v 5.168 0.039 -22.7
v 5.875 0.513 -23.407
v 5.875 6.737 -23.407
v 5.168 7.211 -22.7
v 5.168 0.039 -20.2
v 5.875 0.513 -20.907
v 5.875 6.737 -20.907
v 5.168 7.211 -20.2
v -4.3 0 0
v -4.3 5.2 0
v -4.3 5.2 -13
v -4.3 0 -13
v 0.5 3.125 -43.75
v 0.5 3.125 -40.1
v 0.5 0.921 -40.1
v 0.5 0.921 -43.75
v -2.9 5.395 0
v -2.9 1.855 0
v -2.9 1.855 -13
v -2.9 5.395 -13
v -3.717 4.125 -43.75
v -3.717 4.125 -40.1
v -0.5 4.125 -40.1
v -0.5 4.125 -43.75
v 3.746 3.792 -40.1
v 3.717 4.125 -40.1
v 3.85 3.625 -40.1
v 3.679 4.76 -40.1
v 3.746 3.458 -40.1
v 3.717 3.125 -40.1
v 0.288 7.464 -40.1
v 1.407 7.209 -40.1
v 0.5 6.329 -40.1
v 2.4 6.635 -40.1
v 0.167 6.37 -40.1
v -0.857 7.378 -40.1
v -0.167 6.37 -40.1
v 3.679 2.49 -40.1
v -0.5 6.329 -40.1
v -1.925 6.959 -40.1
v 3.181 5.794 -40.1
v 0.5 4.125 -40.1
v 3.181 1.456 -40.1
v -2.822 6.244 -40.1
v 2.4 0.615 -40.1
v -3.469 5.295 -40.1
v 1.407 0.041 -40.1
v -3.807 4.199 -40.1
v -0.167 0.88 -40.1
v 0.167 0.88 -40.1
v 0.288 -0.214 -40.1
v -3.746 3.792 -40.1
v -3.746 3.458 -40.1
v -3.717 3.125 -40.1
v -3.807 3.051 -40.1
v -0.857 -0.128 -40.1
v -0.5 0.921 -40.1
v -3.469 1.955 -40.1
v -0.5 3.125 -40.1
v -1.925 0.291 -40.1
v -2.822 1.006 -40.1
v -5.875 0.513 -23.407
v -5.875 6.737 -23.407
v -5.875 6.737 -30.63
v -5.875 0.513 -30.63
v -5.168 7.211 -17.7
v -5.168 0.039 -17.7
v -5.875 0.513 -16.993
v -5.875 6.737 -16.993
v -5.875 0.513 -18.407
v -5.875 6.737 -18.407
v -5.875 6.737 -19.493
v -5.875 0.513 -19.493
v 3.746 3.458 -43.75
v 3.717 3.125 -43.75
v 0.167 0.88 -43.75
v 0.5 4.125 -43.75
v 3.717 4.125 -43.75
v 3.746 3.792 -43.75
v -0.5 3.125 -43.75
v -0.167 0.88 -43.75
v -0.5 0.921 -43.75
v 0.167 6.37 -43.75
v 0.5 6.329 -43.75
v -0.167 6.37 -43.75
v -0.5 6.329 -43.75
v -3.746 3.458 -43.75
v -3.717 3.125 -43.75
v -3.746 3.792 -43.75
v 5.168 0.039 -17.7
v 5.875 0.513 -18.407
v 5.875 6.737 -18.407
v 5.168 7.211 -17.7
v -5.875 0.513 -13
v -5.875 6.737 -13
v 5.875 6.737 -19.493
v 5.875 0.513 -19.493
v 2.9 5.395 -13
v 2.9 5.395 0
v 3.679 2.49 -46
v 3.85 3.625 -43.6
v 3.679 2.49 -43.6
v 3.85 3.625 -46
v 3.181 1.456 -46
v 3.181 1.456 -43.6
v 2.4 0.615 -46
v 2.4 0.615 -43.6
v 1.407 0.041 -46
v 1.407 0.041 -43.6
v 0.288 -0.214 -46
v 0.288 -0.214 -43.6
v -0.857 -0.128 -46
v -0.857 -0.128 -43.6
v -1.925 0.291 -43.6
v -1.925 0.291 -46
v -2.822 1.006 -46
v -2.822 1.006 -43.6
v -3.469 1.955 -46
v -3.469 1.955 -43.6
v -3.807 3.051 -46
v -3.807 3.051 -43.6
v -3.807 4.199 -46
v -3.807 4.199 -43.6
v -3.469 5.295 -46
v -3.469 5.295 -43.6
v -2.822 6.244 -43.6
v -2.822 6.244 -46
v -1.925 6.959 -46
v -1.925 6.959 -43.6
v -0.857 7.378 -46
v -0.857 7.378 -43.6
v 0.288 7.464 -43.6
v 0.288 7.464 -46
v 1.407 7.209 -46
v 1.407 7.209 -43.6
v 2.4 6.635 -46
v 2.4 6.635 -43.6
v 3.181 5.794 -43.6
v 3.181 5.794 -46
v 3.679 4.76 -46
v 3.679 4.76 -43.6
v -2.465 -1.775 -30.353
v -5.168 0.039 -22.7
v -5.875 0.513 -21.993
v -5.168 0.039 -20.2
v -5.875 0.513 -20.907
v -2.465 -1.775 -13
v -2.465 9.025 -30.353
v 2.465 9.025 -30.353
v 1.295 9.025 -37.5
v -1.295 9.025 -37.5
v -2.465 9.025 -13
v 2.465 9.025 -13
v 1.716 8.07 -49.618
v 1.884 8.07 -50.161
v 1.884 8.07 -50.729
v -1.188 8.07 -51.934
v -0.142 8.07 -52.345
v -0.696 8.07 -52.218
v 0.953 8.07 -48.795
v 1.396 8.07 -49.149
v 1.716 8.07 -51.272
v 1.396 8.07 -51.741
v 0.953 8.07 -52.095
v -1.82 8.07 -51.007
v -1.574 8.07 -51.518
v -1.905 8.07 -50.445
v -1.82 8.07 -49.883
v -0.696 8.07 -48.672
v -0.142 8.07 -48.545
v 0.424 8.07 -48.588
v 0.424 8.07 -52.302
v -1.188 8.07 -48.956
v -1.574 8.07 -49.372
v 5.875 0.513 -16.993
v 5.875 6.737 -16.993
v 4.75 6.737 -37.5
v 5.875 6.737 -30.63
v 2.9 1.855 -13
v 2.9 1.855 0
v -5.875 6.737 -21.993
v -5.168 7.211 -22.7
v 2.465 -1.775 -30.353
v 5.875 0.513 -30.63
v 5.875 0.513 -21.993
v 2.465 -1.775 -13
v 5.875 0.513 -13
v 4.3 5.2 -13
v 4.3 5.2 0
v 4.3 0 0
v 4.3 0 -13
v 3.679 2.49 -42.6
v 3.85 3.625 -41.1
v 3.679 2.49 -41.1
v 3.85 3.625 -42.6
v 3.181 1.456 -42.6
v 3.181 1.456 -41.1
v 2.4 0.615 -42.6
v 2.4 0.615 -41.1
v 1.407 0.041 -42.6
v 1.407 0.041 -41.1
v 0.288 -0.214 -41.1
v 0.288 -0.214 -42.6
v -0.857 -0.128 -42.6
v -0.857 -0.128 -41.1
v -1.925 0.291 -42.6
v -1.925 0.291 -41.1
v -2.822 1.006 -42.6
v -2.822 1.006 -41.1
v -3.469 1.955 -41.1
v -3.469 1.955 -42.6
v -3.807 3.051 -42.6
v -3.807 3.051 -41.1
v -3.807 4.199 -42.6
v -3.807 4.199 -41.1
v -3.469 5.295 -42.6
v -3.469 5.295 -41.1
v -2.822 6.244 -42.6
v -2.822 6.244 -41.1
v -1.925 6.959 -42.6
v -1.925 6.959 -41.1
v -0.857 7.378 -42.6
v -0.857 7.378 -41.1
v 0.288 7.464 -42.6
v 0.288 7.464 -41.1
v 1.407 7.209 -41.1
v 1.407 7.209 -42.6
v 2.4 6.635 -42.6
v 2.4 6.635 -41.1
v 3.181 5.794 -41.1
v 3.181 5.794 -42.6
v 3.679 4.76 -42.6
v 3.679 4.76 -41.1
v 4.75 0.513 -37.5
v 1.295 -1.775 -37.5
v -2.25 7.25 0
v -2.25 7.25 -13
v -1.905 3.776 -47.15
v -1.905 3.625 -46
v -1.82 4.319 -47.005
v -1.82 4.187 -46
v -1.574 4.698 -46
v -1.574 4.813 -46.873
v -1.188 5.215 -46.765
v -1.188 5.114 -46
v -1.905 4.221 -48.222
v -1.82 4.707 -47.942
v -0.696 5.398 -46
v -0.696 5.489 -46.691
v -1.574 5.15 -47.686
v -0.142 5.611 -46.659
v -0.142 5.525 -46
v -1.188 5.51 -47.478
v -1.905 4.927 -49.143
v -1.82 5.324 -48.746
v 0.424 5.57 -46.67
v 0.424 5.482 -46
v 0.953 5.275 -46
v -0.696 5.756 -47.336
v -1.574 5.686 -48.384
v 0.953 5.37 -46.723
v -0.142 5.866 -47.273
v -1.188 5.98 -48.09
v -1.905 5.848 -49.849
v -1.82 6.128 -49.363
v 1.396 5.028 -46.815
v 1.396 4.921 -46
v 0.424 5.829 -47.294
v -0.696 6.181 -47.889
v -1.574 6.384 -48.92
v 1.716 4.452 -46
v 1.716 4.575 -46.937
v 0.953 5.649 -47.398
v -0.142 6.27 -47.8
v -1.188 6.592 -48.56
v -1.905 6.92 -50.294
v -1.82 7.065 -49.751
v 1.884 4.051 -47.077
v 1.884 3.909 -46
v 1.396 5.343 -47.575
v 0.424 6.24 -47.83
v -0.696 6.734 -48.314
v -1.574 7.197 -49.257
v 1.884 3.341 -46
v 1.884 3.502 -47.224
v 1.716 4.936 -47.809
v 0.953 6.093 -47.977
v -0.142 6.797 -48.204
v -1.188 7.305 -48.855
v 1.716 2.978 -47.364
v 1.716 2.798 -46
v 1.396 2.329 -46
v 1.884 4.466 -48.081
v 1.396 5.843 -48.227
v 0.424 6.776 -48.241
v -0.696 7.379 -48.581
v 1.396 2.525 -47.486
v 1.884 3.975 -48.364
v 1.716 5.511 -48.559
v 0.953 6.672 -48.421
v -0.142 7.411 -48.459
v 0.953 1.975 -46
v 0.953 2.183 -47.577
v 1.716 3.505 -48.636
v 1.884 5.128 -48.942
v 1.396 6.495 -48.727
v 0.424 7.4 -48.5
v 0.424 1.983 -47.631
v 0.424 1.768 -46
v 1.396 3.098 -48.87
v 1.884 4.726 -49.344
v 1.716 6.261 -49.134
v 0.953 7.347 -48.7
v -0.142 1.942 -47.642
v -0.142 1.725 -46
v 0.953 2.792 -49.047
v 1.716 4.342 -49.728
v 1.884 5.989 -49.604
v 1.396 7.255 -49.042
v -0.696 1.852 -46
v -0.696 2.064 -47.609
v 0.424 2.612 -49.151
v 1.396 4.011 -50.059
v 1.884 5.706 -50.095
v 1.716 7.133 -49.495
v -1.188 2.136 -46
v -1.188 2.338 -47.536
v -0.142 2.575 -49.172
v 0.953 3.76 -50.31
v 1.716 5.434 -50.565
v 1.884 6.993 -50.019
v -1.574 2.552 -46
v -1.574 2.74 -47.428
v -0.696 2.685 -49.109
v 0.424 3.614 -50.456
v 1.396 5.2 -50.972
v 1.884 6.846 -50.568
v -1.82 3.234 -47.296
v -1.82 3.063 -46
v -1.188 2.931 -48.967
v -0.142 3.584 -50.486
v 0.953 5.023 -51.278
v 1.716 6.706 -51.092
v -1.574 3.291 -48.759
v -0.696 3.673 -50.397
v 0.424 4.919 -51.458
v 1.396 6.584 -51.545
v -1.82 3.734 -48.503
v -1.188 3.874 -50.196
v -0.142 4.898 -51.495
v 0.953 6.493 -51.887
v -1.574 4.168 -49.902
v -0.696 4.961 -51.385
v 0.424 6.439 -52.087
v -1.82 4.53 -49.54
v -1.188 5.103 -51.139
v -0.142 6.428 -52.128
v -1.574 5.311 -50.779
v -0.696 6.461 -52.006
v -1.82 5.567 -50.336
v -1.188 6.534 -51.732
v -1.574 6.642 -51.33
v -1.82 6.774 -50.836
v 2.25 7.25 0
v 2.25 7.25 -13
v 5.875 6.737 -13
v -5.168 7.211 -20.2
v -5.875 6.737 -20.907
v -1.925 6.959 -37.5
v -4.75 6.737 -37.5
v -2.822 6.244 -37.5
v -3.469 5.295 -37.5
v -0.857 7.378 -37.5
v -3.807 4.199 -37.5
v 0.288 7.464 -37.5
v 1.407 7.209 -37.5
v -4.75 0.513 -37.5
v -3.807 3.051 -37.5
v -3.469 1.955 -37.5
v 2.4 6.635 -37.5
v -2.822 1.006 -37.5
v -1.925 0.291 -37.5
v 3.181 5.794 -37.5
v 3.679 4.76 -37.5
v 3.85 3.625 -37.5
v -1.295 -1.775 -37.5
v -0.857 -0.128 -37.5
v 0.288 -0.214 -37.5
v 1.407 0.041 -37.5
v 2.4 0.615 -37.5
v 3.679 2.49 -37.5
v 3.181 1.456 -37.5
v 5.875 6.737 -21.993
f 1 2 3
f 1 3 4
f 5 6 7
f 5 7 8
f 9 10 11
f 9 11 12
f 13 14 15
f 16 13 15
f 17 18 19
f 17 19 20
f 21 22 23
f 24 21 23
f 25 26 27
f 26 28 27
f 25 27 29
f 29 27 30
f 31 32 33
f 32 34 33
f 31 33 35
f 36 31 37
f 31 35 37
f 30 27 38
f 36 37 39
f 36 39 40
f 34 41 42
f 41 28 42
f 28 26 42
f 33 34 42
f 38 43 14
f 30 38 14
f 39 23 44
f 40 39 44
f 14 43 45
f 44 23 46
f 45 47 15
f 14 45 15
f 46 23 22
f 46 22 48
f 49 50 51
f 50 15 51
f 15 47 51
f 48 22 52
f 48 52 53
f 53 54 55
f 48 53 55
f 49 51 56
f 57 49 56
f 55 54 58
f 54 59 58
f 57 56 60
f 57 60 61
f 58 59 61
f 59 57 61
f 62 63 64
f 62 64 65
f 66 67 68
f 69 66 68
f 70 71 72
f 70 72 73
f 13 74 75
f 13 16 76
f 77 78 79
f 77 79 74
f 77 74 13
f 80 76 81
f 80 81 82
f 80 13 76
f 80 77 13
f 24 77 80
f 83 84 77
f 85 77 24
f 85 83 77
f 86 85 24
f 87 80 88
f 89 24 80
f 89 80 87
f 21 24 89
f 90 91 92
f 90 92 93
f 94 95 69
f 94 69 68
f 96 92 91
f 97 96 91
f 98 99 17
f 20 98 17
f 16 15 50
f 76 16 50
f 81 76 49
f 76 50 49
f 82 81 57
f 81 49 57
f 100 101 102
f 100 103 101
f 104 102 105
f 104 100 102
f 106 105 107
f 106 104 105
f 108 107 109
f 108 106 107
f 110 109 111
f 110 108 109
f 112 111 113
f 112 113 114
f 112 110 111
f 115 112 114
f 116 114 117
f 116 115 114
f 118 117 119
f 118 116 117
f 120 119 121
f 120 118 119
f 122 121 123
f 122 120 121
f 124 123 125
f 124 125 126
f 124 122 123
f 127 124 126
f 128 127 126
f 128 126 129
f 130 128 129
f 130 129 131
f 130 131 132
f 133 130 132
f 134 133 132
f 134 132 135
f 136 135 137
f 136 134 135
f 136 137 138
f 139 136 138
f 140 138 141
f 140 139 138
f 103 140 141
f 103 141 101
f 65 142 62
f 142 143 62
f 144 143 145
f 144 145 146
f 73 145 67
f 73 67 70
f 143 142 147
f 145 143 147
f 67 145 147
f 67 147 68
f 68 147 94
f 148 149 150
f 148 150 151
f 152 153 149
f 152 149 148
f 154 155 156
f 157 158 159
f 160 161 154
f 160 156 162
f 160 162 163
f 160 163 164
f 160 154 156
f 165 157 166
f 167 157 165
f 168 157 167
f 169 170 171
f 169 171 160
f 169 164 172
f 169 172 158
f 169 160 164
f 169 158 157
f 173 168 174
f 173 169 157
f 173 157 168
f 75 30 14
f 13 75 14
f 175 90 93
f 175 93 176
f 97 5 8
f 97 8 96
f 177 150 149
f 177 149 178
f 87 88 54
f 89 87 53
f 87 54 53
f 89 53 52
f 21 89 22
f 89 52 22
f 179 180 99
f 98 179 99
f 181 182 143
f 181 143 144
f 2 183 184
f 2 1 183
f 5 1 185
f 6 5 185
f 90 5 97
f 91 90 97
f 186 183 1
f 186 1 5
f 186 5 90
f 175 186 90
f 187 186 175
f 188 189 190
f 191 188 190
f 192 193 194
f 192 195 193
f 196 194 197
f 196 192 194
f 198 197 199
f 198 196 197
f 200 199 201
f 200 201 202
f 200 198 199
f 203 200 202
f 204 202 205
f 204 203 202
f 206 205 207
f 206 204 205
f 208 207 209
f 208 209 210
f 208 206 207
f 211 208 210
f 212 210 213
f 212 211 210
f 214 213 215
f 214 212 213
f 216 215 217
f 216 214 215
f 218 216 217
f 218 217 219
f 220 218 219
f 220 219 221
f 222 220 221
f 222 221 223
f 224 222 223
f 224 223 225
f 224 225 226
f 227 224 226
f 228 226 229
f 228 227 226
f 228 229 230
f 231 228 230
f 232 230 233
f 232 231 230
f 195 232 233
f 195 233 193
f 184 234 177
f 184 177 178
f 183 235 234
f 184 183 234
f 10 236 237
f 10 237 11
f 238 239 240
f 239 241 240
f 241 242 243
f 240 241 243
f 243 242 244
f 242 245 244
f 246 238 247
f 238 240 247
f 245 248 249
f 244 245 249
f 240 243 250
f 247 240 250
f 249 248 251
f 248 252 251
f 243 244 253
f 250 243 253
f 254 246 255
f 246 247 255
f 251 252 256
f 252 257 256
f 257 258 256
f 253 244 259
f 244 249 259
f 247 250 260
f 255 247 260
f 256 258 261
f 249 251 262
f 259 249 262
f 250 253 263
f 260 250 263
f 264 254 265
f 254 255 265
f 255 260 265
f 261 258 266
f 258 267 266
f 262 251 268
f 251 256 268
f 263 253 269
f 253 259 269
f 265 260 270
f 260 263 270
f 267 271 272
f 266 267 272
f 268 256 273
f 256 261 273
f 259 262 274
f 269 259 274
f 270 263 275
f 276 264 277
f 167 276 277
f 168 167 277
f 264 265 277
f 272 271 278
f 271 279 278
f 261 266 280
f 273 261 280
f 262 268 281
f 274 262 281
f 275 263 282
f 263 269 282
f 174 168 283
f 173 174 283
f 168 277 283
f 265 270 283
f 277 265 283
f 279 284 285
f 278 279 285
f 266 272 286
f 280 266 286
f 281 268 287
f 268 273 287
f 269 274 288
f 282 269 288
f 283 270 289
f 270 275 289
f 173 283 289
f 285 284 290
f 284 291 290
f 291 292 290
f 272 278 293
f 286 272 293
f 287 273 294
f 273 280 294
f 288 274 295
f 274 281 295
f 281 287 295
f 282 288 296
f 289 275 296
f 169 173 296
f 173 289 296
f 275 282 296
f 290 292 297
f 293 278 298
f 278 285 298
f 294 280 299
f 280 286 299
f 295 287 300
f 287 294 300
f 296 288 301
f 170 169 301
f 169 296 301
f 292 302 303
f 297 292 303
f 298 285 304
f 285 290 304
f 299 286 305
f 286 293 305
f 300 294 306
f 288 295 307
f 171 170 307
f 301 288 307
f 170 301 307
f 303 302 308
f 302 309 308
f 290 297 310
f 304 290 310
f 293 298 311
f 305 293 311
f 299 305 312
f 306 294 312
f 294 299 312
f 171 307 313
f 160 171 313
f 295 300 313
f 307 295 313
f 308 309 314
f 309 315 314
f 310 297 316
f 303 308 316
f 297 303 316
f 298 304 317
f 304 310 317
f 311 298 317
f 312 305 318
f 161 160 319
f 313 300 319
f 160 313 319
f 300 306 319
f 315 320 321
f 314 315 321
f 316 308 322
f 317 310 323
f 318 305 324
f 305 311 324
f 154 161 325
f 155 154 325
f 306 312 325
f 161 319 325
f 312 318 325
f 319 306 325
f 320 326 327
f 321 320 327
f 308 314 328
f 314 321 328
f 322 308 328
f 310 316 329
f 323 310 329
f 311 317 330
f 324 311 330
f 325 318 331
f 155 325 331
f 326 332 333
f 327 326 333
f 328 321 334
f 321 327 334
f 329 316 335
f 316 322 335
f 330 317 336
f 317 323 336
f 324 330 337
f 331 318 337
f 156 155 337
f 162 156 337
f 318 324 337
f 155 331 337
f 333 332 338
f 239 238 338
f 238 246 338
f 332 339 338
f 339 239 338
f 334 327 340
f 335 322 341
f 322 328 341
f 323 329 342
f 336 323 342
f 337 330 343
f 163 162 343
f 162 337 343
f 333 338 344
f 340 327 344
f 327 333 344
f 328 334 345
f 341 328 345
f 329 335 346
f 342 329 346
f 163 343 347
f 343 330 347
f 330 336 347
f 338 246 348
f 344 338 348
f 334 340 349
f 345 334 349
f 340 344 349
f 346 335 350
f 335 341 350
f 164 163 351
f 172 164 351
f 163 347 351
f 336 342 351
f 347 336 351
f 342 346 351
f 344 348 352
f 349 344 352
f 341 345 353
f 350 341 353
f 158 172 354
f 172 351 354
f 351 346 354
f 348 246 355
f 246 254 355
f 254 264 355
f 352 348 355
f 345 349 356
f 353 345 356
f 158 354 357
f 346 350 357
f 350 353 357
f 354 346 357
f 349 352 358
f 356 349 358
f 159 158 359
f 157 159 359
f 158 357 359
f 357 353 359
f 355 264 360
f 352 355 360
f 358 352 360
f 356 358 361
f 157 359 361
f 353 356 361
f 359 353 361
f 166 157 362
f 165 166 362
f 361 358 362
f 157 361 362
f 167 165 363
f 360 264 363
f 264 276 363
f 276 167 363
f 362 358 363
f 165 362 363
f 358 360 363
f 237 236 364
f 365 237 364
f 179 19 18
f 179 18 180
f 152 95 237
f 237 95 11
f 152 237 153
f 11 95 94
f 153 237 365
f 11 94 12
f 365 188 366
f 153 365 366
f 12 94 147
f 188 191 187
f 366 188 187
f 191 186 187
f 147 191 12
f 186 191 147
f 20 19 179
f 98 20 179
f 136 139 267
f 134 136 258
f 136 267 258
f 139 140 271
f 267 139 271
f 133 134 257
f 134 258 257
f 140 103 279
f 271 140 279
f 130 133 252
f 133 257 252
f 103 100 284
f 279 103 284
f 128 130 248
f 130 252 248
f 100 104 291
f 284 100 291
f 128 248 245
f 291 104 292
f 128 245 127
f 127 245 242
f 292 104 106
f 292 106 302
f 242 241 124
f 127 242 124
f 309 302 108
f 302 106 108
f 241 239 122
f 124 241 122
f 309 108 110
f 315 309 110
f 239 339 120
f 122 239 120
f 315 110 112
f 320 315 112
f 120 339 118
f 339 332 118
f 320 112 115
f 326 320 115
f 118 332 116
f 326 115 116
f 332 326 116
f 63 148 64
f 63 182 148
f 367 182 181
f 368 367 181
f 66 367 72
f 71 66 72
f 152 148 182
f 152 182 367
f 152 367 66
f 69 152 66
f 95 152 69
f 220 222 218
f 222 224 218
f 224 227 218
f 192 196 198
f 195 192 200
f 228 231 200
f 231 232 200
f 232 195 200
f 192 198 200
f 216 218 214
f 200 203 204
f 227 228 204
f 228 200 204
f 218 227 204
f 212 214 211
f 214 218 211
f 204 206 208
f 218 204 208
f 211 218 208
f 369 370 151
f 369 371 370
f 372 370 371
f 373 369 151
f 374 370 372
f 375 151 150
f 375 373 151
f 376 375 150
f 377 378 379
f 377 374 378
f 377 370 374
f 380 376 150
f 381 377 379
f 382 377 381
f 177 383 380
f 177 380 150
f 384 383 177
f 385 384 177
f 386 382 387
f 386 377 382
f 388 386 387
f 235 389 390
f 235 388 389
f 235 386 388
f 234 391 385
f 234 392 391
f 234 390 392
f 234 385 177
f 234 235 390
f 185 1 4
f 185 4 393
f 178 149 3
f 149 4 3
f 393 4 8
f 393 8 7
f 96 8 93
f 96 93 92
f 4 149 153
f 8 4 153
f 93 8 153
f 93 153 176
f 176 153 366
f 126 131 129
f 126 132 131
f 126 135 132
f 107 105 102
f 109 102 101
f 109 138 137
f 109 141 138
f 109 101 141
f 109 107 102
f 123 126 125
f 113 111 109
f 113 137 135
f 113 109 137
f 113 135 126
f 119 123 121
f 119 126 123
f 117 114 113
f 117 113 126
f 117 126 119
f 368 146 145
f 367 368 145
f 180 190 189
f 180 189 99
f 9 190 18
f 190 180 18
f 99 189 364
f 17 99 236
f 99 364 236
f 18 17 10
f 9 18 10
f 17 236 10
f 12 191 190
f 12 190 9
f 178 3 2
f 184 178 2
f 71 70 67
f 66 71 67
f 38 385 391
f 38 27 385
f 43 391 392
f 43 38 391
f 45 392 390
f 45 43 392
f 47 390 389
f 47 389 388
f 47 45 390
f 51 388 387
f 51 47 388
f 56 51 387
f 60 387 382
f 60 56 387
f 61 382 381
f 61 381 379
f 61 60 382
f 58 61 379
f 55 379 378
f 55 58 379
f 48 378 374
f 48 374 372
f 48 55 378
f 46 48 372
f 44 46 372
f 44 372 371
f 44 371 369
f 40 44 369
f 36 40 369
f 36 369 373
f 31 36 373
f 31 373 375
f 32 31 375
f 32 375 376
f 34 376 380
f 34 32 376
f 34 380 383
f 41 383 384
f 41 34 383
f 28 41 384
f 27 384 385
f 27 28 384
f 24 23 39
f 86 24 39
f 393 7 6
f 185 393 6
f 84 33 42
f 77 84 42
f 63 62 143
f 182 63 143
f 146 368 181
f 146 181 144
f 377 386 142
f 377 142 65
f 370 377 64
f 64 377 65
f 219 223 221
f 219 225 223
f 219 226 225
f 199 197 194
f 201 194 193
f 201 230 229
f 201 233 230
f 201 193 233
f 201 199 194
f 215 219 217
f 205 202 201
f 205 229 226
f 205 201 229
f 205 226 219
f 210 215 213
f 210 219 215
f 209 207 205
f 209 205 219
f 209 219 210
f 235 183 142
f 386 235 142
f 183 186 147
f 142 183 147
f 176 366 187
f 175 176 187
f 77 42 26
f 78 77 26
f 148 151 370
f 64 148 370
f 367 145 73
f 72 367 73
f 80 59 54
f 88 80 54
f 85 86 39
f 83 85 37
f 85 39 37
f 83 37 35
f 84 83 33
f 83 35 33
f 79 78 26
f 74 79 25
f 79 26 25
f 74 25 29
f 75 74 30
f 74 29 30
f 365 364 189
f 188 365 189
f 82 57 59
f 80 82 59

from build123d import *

# Parameters (mm, degrees)
SKETCH1_W           = 1.3
SKETCH1_H           = 0.555
BOSS_EXTRUDE1_DEPTH = 13
SKETCH3_W           = 2.9
SKETCH3_H           = 1.77
BOSS_EXTRUDE2_DEPTH = 24.5
CUT_EXTRUDE1_DEPTH  = 40.015589833
CHAMFER1_SIZE       = 3.41
CHAMFER1_SIZE_2     = 2.287970931
SKETCH7_W           = 3.85
SKETCH7_H           = 2.6
SKETCH7_H_2         = 1.5
SKETCH7_H_3         = 2.4
BOSS_EXTRUDE3_DEPTH = 6.25
SKETCH8_R           = 1.905
REVOLVE2_ANGLE      = 90


with BuildPart() as part:
    # Sketch1 → Boss-Extrude1 (new body)
    with BuildSketch(Plane.XY):
        Polygon((-1.3, 0.3), (-1.3, 1.3), (-1.3, 1.855), (-2.9, 1.855), (-2.9, 5.395), (-1.3, 5.395), (-1.3, 5.95), (-1.3, 6.95), (-2.125735931, 6.95), (-4, 5.075735931), (-4, 0.3), align=None)
        with Locations((-0.65, 1.5775)):
            Rectangle(SKETCH1_W, SKETCH1_H)
        Polygon((-4.3, 0), (0, 0), (0, 1.3), (-1.3, 1.3), (-1.3, 0.3), (-4, 0.3), (-4, 5.075735931), (-2.125735931, 6.95), (-1.3, 6.95), (-1.3, 5.95), (0, 5.95), (0, 7.25), (-2.25, 7.25), (-4.3, 5.2), align=None)
        with Locations((-0.65, 5.6725)):
            Rectangle(SKETCH1_W, SKETCH1_H)
    extrude(amount=-BOSS_EXTRUDE1_DEPTH)

    # Mirror1: part across plane


with BuildPart() as part_1:
    add(part.part)
    add(part.part.mirror(Plane(origin=(0, 0, -13), x_dir=(0, 0, 1), z_dir=(-1, 0, 0))))

    # Sketch3 → Boss-Extrude2 (add)
    with BuildSketch(Plane(origin=(0, 0, -13), x_dir=(-1, 0, 0), z_dir=(0, 0, -1))):
        with Locations((1.45, 4.51)):
            Rectangle(SKETCH3_W, SKETCH3_H)
        Polygon((2.25, 7.25), (0, 7.25), (0, 5.395), (2.9, 5.395), (2.9, 3.625), (4.3, 3.625), (4.3, 5.2), align=None)
        Polygon((3.043750454, 9.025), (0, 9.025), (0, 7.25), (2.25, 7.25), (4.3, 5.2), (4.3, 3.625), (5.875, 3.625), (5.875, 7.125), (5.875, 9.025), align=None)
    extrude(amount=BOSS_EXTRUDE2_DEPTH)

    # Sketch4 → Cut-Extrude1 (cut, through all)
    with BuildSketch(Plane(origin=(0, 9.025, 0), x_dir=(1, 0, 0), z_dir=(0, 1, 0))):
        Polygon((-4.75, 37.5), (-5.875, 30.63), (-5.875, 37.5), align=None)
        Polygon((-5.875, 23.407106781), (-5.167893219, 22.7), (-5.875, 21.992893219), align=None)
        Polygon((-5.167893219, 20.2), (-5.875, 19.492893219), (-5.875, 20.907106781), align=None)
        Polygon((-5.167893219, 17.7), (-5.875, 16.992893219), (-5.875, 18.407106781), align=None)
    extrude(amount=-CUT_EXTRUDE1_DEPTH, mode=Mode.SUBTRACT)

    # Chamfer1
    # the kernel refuses this chamfer: 3.41, 2.287970931 mm, written as the material it takes off along each edge
    with BuildSketch(Plane(origin=(-5.875, 9.025, -4.189784247), x_dir=(0.9997674455612761, 0.021565129164482656, 0), z_dir=(0, 0, -1))) as chamfer1_piece_1:
        Polygon((CHAMFER1_SIZE * 0.999767445561, CHAMFER1_SIZE * 0.0215651291645), (-CHAMFER1_SIZE_2 * 0.0215651291646, CHAMFER1_SIZE_2 * 0.999767445568), (0, 0), align=None)
    extrude(amount=21.613324726, mode=Mode.SUBTRACT)
    with BuildSketch(Plane(origin=(-5.875, 9.025, -14.596891028), x_dir=(0.9997674455612761, 0.021565129164482656, 0), z_dir=(0, 0, -1))) as chamfer1_piece_2:
        Polygon((CHAMFER1_SIZE * 0.999767445561, CHAMFER1_SIZE * 0.0215651291645), (-CHAMFER1_SIZE_2 * 0.0215651291646, CHAMFER1_SIZE_2 * 0.999767445568), (0, 0), align=None)
    extrude(amount=24.843324726, mode=Mode.SUBTRACT)
    with BuildSketch(Plane(origin=(-3.326242426, 9.025, -46.194412918), x_dir=(0.986626348001283, 0.021565129164482656, 0.1615654500002101), z_dir=(-0.16160303150249725, 0, 0.9868558457085832))) as chamfer1_piece_3:
        Polygon((CHAMFER1_SIZE * 0.999767445561, -CHAMFER1_SIZE * 0.0215651291645), (-CHAMFER1_SIZE_2 * 0.0215651291646, -CHAMFER1_SIZE_2 * 0.999767445568), (0, 0), align=None)
    extrude(amount=24.581934577, mode=Mode.SUBTRACT)


with BuildPart() as body_2:
    # Split1: the piece on the far side of the plane
    add(part_1.part)
    split(bisect_by=Plane.XY.offset(-13), keep=Keep.BOTTOM)

    # Mirror9: body 2 across plane


with BuildPart() as part_2:
    add(part_1.part)

    # Split1
    split(bisect_by=Plane.XY.offset(-13), keep=Keep.TOP)


with BuildPart() as body_2_1:
    add(body_2.part)
    add(body_2.part.mirror(Plane(origin=(0, 0, -37.5), x_dir=(0, 0, 1), z_dir=(-1, 0, 0))))

    # Mirror10: body 2 across plane


with BuildPart() as body_2_2:
    add(body_2_1.part)
    add(body_2_1.part.mirror(Plane(origin=(0, 3.625, -37.5), x_dir=(0, 0, 1), z_dir=(0, 1, 0))))

    # Combine1: union part
    add(part_2.part)

    # Sketch7 → Revolve1 (revolve)
    with BuildSketch(Plane(origin=(0, 3.625, 0), x_dir=(1, 0, 0), z_dir=(0, 1, 0))):
        with Locations((1.925, 38.8)):
            Rectangle(SKETCH7_W, SKETCH7_H)
        with Locations((1.925, 41.85)):
            Rectangle(SKETCH7_W, SKETCH7_H_2)
        with Locations((1.925, 44.8)):
            Rectangle(SKETCH7_W, SKETCH7_H_3)
    revolve(axis=Axis((0, 3.625, -43.6), (0, 0, -1)))


with BuildPart() as revolve1_piece_1:
    # of the separate pieces the step leaves, piece 1, a body of its own (revolve1_pieces)
    add(body_2_2.part.solids().sort_by_distance((-5.875, 6.737029069, -13))[0])

    # Sketch5 → Boss-Extrude3 (add)
    with BuildSketch(Plane(origin=(0, 0, -37.5), x_dir=(-1, 0, 0), z_dir=(0, 0, -1))):
        with BuildLine():
            Line((-0.5, 6.329163457), (-0.5, 4.125))
            Line((-0.5, 4.125), (-3.716517187, 4.125))
            ThreePointArc((-3.716517187, 4.125), (-3.75, 3.625), (-3.716517187, 3.125))
            Line((-3.716517187, 3.125), (-0.5, 3.125))
            Line((-0.5, 3.125), (-0.5, 0.920836543))
            ThreePointArc((-0.5, 0.920836543), (0, 0.875), (0.5, 0.920836543))
            Line((0.5, 0.920836543), (0.5, 3.125))
            Line((0.5, 3.125), (3.716517187, 3.125))
            ThreePointArc((3.716517187, 3.125), (3.75, 3.625), (3.716517187, 4.125))
            Line((3.716517187, 4.125), (0.5, 4.125))
            Line((0.5, 4.125), (0.5, 6.329163457))
            ThreePointArc((0.5, 6.329163457), (0, 6.375), (-0.5, 6.329163457))
        make_face()
    extrude(amount=BOSS_EXTRUDE3_DEPTH)


with BuildPart() as revolve1_piece_2:
    # of the separate pieces the step leaves, piece 2, a body of its own (revolve1_pieces)
    add(body_2_2.part.solids().sort_by_distance((3.85, 3.625, -43.6))[0])

    # Sketch8 → Revolve2 (revolve)
    with BuildSketch(Plane(origin=(0, 0, -46), x_dir=(-1, 0, 0), z_dir=(0, 0, -1))):
        with Locations((0, 3.625)):
            Circle(SKETCH8_R)
    revolve(axis=Axis((4.502336245, 8.07, -46), (1, 0, 0)), revolution_arc=REVOLVE2_ANGLE)


with BuildPart() as revolve1_piece_3:
    # of the separate pieces the step leaves, piece 3, a body of its own (revolve1_pieces)
    add(body_2_2.part.solids().sort_by_distance((3.85, 3.625, -41.1))[0])


solid = Compound([revolve1_piece_1.part, revolve1_piece_2.part, revolve1_piece_3.part])
